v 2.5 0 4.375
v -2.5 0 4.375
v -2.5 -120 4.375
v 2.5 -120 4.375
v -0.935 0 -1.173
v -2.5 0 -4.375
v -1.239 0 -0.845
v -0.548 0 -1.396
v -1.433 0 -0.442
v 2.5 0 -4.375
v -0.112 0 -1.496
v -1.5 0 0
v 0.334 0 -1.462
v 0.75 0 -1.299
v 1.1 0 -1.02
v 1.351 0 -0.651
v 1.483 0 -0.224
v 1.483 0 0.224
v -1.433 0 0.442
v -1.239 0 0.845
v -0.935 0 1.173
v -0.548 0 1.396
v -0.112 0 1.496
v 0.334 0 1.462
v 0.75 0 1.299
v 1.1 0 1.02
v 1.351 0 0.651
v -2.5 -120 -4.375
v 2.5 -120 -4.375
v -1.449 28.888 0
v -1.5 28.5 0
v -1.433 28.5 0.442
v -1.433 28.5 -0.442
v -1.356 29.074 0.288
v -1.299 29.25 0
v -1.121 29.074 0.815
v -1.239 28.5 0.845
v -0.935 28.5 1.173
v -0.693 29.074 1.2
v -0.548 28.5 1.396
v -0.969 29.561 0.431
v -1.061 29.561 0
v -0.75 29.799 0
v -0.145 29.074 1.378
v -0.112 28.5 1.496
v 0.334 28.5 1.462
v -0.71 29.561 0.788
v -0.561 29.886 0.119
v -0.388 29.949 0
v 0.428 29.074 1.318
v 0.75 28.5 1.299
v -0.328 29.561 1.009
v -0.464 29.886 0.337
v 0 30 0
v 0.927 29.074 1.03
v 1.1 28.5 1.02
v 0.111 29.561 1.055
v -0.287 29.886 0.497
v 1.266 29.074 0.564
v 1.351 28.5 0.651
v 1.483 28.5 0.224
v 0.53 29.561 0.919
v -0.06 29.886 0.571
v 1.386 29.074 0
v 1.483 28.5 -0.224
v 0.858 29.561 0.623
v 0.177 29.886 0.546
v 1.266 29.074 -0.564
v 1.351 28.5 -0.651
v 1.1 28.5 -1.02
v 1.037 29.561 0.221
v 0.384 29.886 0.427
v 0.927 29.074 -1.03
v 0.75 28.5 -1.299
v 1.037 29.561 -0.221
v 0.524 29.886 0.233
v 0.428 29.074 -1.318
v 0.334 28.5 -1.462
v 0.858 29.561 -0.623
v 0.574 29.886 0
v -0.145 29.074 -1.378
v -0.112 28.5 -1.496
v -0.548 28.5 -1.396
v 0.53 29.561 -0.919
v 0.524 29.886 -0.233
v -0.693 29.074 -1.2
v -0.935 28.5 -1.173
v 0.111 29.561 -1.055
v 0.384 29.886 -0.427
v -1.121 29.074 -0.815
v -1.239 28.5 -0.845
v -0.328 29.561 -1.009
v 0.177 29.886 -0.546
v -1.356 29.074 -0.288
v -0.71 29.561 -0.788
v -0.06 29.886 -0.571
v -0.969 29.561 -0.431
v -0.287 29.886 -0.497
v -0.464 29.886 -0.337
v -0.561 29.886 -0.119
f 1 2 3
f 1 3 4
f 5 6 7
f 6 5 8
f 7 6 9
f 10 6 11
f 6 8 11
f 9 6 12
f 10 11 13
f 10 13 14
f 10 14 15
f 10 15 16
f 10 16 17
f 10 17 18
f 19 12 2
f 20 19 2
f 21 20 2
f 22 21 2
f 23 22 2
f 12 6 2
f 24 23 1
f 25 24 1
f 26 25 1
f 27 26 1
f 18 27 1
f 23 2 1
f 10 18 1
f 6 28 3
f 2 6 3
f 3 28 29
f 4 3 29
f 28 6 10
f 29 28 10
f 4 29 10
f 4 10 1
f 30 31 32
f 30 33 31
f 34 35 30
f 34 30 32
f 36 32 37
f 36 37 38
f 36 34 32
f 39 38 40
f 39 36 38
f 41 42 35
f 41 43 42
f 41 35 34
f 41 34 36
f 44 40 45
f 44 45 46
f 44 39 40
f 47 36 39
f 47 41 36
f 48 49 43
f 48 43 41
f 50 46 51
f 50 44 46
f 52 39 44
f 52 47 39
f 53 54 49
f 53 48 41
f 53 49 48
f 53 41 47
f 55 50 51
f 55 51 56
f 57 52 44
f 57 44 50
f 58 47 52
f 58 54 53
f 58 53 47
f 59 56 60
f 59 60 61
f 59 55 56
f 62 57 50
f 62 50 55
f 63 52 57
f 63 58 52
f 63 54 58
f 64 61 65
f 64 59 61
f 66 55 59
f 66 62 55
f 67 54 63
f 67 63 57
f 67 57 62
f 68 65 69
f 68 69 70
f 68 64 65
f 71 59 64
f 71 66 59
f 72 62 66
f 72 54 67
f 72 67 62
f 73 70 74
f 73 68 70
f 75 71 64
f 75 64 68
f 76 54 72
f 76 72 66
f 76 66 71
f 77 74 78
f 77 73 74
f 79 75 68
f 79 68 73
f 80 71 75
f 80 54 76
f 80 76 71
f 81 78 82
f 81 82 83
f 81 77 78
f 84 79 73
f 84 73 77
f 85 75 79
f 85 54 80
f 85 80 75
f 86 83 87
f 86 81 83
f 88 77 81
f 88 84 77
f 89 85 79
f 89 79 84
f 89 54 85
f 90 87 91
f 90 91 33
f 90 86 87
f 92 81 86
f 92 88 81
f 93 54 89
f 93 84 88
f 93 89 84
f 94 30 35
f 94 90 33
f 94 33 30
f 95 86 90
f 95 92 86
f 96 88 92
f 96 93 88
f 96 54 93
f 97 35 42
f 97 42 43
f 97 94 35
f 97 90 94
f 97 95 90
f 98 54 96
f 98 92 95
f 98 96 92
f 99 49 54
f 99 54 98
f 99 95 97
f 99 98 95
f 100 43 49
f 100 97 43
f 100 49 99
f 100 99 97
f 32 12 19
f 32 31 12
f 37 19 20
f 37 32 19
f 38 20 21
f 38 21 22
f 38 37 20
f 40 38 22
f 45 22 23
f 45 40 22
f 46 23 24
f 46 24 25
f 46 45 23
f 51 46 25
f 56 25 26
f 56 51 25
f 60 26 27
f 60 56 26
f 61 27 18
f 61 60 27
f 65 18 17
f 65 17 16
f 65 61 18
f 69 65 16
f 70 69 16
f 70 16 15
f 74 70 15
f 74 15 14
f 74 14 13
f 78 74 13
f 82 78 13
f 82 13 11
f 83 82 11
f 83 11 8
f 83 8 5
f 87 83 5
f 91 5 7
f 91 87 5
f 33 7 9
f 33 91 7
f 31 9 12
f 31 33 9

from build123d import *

# Parameters (mm, degrees)
SCHIZZO2_W                   = 5
SCHIZZO2_H                   = 8.75
ESTRUSIONE_ESTRUSIONE1_DEPTH = 120


with BuildPart() as part:
    # Schizzo1 → Rivoluzione2 (revolve)
    with BuildSketch(Plane.XY):
        with BuildLine():
            Line((-1.5, 0), (-1.5, 28.5))
            ThreePointArc((-1.5, 28.5), (-1.060660172, 29.560660172), (0, 30))
            Line((0, 30), (0, 0))
            Line((0, 0), (-1.5, 0))
        make_face()
    revolve(axis=Axis((0, 0, 0), (0, 1, 0)))

    # Schizzo2 → Estrusione-Estrusione1 (add)
    with BuildSketch(Plane.XZ):
        Rectangle(SCHIZZO2_W, SCHIZZO2_H)
    extrude(amount=ESTRUSIONE_ESTRUSIONE1_DEPTH)


solid = part.part
